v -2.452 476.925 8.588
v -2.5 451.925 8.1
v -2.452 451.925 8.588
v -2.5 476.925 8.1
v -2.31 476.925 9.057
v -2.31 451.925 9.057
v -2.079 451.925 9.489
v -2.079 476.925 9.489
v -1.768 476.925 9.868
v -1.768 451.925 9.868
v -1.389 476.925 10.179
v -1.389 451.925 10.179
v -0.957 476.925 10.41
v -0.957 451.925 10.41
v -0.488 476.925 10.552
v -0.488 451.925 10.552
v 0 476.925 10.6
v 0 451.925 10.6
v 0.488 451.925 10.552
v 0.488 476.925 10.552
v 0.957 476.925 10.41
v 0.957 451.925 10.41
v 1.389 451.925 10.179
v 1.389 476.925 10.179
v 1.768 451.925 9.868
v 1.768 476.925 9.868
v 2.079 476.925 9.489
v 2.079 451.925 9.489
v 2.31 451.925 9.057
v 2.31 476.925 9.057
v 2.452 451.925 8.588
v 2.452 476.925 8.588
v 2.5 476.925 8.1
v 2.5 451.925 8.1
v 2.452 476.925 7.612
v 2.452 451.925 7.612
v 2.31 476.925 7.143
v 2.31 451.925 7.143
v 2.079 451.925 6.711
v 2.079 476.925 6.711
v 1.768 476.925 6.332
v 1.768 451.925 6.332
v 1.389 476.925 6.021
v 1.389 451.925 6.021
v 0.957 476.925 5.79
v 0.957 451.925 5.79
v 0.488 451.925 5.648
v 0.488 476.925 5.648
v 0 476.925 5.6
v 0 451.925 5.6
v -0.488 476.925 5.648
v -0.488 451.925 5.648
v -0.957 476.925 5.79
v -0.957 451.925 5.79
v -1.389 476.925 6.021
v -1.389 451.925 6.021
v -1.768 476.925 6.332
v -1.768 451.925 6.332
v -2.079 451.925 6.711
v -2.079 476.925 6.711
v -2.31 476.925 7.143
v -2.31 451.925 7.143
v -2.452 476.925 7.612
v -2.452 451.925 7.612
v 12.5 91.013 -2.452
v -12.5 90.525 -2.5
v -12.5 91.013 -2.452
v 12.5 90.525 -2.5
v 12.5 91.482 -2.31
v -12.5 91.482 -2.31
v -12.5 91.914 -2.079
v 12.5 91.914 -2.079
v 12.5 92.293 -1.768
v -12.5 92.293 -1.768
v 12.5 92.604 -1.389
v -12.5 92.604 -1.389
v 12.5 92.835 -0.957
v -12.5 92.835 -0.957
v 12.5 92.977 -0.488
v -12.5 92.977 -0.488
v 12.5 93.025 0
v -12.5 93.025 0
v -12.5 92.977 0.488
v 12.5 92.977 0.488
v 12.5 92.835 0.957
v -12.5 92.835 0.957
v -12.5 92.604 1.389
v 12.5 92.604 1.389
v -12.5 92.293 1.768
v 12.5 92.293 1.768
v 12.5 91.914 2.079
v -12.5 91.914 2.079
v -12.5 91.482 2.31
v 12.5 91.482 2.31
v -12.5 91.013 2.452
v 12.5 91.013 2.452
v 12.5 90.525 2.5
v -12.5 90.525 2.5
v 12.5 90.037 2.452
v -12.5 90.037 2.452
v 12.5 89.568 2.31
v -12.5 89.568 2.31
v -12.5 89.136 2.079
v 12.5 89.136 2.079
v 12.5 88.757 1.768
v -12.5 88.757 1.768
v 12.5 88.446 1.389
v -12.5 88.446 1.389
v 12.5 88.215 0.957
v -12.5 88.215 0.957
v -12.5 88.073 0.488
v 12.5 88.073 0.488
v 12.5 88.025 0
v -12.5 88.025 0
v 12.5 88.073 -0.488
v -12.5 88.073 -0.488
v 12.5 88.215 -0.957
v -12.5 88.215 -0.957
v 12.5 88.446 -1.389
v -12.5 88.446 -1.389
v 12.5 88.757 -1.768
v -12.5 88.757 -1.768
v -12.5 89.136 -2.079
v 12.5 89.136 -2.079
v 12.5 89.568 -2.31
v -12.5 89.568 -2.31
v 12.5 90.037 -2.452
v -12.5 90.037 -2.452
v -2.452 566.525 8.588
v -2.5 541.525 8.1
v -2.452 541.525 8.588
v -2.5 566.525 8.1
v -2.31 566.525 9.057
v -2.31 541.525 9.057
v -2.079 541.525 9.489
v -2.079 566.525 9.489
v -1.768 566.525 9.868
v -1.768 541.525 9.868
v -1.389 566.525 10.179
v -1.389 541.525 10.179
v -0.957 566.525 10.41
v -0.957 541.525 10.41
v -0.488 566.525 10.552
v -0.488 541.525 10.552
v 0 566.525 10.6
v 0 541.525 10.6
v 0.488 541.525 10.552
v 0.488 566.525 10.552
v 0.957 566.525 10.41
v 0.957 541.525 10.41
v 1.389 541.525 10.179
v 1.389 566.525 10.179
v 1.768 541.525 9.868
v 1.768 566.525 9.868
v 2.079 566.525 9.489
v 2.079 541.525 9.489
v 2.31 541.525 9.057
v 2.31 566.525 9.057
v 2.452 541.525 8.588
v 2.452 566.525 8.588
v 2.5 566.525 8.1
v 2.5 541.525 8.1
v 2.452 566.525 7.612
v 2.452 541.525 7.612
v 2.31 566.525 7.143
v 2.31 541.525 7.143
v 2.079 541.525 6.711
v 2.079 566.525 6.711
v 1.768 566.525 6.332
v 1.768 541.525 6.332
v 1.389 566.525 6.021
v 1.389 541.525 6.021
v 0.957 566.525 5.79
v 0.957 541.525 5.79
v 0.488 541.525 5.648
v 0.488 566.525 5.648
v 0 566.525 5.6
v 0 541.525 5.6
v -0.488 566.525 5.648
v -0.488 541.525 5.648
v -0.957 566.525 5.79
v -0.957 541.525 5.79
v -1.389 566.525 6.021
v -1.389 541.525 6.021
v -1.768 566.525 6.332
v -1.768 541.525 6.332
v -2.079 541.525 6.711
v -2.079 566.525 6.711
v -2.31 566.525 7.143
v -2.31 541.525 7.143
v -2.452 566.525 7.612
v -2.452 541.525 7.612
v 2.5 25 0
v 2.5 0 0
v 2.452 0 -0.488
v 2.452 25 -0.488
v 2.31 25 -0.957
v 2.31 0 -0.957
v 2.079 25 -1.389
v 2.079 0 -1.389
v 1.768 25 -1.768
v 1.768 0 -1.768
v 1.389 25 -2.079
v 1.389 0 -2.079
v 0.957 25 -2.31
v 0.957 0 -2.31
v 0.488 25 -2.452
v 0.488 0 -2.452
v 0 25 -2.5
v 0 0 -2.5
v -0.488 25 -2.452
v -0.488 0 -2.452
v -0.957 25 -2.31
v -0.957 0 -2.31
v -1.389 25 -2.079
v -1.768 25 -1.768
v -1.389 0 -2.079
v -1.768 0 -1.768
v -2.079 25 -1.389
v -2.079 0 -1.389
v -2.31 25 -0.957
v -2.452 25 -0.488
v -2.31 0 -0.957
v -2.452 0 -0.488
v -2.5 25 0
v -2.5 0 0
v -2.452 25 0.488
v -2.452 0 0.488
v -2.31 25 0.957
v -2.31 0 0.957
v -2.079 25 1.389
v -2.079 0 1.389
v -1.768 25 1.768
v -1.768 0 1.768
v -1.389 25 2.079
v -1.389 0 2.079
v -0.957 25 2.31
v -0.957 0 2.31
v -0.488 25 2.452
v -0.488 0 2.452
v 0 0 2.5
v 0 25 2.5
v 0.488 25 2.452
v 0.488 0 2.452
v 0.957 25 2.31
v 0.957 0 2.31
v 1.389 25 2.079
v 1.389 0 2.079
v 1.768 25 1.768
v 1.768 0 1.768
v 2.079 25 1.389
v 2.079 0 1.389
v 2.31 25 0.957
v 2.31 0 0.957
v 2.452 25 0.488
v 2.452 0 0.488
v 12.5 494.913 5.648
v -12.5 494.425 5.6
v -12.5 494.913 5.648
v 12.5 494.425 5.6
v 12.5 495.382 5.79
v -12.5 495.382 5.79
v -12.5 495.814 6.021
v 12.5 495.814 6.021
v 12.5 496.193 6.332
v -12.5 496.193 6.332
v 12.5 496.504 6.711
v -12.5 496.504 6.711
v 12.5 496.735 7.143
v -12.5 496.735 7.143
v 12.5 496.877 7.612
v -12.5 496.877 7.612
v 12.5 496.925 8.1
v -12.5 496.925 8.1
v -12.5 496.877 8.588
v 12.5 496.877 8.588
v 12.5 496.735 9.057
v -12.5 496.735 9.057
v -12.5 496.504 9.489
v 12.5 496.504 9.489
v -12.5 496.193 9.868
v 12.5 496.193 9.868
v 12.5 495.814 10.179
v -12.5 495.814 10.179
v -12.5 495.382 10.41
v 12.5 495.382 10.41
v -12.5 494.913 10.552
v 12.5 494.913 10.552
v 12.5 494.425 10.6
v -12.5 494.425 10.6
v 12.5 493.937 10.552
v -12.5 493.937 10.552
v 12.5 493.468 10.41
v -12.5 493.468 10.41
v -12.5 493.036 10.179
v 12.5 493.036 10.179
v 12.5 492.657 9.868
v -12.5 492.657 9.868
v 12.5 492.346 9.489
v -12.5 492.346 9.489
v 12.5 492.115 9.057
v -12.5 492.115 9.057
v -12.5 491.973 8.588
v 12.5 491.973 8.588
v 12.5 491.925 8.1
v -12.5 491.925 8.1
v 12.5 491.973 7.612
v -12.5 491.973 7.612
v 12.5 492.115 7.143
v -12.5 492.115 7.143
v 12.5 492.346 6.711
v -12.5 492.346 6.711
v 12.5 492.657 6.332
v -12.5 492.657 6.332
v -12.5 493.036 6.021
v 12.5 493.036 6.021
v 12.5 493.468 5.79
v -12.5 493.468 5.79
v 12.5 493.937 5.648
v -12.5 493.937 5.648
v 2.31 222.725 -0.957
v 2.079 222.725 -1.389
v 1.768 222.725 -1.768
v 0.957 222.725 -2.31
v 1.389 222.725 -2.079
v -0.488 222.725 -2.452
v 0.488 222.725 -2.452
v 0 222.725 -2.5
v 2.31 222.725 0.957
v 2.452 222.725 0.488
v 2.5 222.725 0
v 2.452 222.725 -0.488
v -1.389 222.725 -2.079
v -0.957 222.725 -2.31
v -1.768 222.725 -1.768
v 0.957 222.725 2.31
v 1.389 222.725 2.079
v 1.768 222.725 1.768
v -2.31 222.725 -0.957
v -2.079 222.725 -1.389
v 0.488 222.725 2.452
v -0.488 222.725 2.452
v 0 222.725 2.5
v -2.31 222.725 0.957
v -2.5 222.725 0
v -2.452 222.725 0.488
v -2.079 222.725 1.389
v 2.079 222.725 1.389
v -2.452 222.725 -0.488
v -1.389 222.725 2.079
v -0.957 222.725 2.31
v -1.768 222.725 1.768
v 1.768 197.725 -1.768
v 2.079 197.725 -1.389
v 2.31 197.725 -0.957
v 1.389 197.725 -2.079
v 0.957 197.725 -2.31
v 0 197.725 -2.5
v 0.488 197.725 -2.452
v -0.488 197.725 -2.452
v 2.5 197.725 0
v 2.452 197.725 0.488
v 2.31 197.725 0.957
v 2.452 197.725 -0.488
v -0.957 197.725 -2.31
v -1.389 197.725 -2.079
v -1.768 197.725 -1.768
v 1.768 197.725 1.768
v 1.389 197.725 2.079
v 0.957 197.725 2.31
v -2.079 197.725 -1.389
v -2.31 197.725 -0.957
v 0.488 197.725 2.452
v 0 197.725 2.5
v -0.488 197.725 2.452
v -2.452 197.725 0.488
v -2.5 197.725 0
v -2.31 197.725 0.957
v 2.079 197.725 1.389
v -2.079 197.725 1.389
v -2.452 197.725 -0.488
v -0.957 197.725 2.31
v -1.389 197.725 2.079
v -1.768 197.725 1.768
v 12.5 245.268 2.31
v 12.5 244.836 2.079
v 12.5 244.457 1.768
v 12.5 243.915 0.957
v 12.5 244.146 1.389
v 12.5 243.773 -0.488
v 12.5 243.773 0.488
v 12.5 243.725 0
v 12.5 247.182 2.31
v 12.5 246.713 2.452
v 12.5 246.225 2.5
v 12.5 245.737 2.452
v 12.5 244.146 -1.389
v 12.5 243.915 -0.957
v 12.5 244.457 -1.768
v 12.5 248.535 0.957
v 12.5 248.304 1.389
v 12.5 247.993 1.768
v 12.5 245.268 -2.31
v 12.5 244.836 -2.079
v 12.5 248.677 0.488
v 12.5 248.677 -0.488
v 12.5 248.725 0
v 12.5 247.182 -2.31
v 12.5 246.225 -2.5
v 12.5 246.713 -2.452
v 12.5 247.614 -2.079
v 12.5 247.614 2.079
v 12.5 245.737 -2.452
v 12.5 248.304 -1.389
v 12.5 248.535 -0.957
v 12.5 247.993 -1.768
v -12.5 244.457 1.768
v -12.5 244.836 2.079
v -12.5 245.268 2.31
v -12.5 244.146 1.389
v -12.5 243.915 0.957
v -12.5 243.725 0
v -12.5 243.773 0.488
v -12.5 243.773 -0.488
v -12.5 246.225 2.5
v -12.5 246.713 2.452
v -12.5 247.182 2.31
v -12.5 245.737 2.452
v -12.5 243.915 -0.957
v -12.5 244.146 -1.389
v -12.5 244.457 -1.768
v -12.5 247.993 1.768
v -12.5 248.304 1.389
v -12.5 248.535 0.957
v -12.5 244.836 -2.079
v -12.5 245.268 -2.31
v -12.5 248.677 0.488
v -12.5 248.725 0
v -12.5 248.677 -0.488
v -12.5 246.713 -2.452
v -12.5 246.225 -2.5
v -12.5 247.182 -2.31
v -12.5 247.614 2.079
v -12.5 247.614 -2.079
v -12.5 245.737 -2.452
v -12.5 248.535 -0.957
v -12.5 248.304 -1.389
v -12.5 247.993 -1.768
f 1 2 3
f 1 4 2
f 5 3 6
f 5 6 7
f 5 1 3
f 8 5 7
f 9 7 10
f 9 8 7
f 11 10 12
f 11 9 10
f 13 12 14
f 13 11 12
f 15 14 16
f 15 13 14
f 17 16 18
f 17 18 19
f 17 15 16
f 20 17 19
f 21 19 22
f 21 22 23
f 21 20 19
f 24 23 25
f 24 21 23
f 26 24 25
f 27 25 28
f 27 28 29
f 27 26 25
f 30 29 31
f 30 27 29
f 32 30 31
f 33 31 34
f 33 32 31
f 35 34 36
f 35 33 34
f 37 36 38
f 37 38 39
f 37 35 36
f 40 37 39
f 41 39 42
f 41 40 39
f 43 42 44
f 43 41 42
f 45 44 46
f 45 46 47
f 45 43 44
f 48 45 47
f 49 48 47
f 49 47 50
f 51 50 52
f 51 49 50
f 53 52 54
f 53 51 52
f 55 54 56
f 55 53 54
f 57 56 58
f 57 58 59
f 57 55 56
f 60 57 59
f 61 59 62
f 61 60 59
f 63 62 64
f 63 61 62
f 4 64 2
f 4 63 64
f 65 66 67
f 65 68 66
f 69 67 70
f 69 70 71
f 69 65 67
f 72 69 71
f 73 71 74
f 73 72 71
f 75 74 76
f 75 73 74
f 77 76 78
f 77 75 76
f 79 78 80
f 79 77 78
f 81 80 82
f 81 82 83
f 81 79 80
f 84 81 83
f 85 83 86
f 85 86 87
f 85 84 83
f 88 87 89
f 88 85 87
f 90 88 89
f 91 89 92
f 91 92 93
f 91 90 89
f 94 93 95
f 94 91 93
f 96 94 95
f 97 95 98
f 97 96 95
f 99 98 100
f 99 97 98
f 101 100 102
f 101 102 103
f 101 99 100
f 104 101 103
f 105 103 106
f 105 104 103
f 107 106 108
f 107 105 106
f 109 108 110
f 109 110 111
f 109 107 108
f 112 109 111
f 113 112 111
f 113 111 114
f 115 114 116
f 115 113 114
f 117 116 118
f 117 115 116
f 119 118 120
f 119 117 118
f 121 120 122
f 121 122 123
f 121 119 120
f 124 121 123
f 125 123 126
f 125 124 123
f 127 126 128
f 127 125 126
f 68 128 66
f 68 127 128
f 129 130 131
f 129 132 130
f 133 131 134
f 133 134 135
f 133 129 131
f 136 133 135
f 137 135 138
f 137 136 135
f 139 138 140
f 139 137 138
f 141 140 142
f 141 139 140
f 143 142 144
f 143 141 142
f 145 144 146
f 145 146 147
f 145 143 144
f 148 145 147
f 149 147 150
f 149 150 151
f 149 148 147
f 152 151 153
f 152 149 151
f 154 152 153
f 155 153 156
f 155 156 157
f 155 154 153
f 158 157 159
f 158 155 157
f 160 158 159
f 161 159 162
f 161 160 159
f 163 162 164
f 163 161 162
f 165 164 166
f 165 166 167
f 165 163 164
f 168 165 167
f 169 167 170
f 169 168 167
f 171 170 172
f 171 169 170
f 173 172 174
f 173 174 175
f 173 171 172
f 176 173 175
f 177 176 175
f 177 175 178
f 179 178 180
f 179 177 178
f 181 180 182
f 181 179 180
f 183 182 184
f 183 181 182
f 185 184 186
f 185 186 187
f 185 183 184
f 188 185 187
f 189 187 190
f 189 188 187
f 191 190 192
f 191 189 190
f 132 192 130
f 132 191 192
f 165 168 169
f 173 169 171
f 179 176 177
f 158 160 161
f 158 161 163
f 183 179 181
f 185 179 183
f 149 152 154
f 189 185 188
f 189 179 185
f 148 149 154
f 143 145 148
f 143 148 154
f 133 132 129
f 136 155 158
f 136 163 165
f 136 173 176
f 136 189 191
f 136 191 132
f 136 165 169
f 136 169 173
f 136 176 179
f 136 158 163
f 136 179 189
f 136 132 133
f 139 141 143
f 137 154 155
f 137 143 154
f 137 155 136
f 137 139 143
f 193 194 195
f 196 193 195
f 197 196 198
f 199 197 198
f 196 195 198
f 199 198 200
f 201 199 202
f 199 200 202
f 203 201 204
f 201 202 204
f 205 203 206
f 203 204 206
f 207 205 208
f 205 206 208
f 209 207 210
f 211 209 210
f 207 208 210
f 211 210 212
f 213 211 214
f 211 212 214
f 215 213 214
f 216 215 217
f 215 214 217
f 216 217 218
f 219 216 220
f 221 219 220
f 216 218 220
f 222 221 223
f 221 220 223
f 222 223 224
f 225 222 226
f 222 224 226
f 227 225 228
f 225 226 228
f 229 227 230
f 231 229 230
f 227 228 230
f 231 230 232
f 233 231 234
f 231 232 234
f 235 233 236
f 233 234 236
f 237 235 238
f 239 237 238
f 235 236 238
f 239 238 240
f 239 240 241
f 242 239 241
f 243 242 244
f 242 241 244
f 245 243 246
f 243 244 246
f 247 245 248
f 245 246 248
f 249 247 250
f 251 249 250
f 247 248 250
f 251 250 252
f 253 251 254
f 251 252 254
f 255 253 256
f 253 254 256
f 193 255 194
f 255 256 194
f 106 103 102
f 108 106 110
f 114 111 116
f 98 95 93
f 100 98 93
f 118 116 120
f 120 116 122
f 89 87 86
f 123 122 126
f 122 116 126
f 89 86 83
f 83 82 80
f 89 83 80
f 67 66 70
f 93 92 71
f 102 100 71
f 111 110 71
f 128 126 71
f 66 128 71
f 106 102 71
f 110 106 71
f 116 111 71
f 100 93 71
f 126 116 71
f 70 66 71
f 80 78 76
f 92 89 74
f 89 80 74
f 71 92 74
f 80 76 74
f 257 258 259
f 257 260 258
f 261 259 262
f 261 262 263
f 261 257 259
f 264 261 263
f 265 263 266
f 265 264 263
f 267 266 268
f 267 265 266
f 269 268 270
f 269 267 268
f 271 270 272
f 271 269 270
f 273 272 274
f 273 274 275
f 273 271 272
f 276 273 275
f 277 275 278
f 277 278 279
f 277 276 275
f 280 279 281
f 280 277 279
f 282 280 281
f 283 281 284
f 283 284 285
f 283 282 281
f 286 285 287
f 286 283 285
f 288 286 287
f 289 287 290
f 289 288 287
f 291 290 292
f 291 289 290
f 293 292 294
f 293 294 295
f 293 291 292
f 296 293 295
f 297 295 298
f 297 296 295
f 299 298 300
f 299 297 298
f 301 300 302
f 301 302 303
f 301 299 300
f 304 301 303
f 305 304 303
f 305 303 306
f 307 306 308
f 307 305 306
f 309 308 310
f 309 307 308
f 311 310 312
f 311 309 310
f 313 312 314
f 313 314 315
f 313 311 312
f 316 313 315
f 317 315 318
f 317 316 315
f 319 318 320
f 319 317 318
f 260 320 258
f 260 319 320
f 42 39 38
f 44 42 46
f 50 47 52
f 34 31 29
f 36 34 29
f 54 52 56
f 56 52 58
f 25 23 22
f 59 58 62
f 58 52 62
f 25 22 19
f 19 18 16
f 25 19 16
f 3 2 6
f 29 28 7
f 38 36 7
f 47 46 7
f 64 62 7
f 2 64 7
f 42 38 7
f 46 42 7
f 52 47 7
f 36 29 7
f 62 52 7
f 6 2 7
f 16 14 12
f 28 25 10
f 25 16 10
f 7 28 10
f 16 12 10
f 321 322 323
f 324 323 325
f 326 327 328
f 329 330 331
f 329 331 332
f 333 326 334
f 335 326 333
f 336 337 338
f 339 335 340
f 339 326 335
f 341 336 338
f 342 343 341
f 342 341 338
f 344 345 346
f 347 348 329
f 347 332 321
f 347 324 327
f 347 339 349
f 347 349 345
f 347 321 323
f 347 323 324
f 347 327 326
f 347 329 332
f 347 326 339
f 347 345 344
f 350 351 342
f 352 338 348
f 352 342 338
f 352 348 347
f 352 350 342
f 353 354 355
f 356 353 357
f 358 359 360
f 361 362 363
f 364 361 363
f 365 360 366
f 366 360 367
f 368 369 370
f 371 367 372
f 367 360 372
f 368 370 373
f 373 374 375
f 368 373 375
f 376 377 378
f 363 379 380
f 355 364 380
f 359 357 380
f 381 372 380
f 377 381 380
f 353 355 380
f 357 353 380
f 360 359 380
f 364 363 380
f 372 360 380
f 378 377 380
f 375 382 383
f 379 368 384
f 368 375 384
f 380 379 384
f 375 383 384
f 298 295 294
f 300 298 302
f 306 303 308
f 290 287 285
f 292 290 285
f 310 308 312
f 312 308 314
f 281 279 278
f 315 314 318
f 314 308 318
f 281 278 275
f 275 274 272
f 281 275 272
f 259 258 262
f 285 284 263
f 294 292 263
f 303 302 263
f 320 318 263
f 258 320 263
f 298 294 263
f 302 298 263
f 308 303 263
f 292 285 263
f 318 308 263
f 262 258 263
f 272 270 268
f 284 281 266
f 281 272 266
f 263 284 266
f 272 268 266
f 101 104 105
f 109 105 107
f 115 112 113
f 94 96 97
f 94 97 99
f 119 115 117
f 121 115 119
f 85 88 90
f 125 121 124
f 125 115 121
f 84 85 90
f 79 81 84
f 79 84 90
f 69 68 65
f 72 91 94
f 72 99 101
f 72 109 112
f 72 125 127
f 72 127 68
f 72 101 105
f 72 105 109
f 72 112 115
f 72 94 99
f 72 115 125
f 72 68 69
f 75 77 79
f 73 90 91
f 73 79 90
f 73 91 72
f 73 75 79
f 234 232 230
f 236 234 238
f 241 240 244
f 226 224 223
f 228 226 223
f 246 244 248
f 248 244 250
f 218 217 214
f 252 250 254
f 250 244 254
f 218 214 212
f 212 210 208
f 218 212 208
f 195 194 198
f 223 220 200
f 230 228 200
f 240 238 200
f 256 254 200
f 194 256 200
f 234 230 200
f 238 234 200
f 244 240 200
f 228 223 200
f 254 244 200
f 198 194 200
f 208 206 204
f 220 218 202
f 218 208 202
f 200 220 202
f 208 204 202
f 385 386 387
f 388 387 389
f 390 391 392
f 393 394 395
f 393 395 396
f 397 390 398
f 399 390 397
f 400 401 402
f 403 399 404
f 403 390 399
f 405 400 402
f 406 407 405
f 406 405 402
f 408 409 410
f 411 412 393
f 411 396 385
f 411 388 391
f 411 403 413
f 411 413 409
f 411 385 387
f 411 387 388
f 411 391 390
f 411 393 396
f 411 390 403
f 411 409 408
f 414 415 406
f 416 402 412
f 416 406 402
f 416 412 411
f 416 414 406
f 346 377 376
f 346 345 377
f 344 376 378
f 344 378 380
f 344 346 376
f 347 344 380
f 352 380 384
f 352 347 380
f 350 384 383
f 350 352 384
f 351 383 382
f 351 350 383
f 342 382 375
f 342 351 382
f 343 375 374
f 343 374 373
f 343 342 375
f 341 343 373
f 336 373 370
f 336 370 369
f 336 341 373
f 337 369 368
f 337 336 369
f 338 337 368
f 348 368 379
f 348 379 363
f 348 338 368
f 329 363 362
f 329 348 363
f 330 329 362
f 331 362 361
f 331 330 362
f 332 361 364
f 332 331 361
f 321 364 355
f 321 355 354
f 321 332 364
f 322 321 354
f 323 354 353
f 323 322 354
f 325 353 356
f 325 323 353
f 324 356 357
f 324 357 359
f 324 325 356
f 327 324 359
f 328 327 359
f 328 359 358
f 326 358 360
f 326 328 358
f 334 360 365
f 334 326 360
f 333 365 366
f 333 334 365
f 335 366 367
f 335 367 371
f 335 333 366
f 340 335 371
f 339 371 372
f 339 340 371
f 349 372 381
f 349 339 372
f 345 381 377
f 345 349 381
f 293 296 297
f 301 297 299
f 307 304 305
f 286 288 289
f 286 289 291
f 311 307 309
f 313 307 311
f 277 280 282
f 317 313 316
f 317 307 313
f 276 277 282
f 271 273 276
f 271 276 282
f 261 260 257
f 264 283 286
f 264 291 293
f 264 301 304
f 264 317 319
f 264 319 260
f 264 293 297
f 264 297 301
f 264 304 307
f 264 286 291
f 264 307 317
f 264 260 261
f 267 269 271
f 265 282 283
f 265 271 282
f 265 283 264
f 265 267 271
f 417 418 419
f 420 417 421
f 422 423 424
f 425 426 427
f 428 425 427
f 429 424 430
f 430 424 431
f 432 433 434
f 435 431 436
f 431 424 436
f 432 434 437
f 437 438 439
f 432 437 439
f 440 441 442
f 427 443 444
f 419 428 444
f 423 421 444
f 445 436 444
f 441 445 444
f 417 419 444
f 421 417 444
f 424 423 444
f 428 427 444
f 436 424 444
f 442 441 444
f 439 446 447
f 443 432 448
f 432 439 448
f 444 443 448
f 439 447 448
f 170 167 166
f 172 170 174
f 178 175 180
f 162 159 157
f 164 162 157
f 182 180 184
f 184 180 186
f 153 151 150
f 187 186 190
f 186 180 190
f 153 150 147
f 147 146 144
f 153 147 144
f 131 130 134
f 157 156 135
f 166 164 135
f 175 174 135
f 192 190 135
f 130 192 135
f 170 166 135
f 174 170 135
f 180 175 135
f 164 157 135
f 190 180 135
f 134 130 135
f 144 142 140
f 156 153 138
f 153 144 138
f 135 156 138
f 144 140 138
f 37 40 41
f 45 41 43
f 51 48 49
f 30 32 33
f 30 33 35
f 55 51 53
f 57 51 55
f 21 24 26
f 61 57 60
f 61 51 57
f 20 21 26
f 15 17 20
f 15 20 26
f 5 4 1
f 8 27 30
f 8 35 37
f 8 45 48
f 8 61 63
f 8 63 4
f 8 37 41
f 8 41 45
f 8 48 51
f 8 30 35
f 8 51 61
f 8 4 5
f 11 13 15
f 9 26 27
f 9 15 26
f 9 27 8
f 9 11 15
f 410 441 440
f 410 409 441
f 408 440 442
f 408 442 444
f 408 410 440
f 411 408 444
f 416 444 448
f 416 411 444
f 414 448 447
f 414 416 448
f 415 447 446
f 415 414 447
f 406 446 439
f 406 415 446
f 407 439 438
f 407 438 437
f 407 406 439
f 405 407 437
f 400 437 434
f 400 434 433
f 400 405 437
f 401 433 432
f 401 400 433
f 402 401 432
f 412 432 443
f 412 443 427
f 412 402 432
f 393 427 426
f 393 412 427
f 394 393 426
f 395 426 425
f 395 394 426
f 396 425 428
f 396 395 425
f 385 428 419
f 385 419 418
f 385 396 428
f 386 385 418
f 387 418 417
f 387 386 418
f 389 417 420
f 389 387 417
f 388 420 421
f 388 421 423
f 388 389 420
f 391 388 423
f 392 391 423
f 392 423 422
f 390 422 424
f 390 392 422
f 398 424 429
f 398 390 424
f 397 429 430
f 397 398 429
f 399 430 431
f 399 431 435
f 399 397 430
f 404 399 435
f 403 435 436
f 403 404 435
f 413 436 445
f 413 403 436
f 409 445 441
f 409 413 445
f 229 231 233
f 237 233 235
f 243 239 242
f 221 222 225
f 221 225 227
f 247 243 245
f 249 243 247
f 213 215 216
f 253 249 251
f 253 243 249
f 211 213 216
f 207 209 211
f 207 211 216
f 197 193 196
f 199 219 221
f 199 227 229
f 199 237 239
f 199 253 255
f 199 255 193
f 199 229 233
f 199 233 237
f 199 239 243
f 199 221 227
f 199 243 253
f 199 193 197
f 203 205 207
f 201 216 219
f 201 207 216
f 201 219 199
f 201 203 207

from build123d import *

# Parameters (mm, degrees)
SKETCH1_R           = 2.5
AXIS_0_AX12_DEPTH   = 25
SKETCH2_R           = 2.5
AXIS_1_EX106_DEPTH  = 12.5
SKETCH3_R           = 2.5
AXIS_2_RX64_1_DEPTH = 12.5
SKETCH4_R           = 2.5
AXIS_3_RX64_2_DEPTH = 12.5
SKETCH5_R           = 2.5
AXIS_4_RX28_1_DEPTH = 12.5
SKETCH6_R           = 2.5
AXIS_5_RX28_2_DEPTH = 12.5
SKETCH7_R           = 2.5
BOSS_EXTRUDE1_DEPTH = 12.5


with BuildPart() as part:
    # Sketch1 → Axis 0 - AX12 (new body)
    with BuildSketch(Plane(origin=(0, 0, 0), x_dir=(1, 0, 0), z_dir=(0, 1, 0))):
        Circle(SKETCH1_R)
    extrude(amount=AXIS_0_AX12_DEPTH)


with BuildPart() as body_2:
    # Sketch2 → Axis 1 - EX106 (new body, symmetric)
    with BuildSketch(Plane(origin=(0, 0, 0), x_dir=(0, 0, -1), z_dir=(1, 0, 0))):
        with Locations((0, 90.525)):
            Circle(SKETCH2_R)
    extrude(amount=AXIS_1_EX106_DEPTH, both=True)


with BuildPart() as body_3:
    # Sketch3 → Axis 2 - RX64 1 (new body, symmetric)
    with BuildSketch(Plane(origin=(0, 210.225, 0), x_dir=(-1, 0, 0), z_dir=(0, 1, 0))):
        Circle(SKETCH3_R)
    extrude(amount=AXIS_2_RX64_1_DEPTH, both=True)


with BuildPart() as body_4:
    # Sketch4 → Axis 3 - RX64 2 (new body, symmetric)
    with BuildSketch(Plane(origin=(0, 0, 0), x_dir=(0, 0, -1), z_dir=(1, 0, 0))):
        with Locations((0, 246.225)):
            Circle(SKETCH4_R)
    extrude(amount=AXIS_3_RX64_2_DEPTH, both=True)


with BuildPart() as body_5:
    # Sketch5 → Axis 4 - RX28 1 (new body, symmetric)
    with BuildSketch(Plane(origin=(0, 464.425, 0), x_dir=(-1, 0, 0), z_dir=(0, 1, 0))):
        with Locations((0, 8.1)):
            Circle(SKETCH5_R)
    extrude(amount=AXIS_4_RX28_1_DEPTH, both=True)


with BuildPart() as body_6:
    # Sketch6 → Axis 5 - RX28 2 (new body, symmetric)
    with BuildSketch(Plane(origin=(0, 0, 0), x_dir=(0, 0, -1), z_dir=(1, 0, 0))):
        with Locations((-8.1, 494.425)):
            Circle(SKETCH6_R)
    extrude(amount=AXIS_5_RX28_2_DEPTH, both=True)


with BuildPart() as body_7:
    # Sketch7 → Boss-Extrude1 (new body, symmetric)
    with BuildSketch(Plane(origin=(0, 554.025, 0), x_dir=(-1, 0, 0), z_dir=(0, 1, 0))):
        with Locations((0, 8.1)):
            Circle(SKETCH7_R)
    extrude(amount=BOSS_EXTRUDE1_DEPTH, both=True)


solid = Compound([part.part, body_2.part, body_3.part, body_4.part, body_5.part, body_6.part, body_7.part])
